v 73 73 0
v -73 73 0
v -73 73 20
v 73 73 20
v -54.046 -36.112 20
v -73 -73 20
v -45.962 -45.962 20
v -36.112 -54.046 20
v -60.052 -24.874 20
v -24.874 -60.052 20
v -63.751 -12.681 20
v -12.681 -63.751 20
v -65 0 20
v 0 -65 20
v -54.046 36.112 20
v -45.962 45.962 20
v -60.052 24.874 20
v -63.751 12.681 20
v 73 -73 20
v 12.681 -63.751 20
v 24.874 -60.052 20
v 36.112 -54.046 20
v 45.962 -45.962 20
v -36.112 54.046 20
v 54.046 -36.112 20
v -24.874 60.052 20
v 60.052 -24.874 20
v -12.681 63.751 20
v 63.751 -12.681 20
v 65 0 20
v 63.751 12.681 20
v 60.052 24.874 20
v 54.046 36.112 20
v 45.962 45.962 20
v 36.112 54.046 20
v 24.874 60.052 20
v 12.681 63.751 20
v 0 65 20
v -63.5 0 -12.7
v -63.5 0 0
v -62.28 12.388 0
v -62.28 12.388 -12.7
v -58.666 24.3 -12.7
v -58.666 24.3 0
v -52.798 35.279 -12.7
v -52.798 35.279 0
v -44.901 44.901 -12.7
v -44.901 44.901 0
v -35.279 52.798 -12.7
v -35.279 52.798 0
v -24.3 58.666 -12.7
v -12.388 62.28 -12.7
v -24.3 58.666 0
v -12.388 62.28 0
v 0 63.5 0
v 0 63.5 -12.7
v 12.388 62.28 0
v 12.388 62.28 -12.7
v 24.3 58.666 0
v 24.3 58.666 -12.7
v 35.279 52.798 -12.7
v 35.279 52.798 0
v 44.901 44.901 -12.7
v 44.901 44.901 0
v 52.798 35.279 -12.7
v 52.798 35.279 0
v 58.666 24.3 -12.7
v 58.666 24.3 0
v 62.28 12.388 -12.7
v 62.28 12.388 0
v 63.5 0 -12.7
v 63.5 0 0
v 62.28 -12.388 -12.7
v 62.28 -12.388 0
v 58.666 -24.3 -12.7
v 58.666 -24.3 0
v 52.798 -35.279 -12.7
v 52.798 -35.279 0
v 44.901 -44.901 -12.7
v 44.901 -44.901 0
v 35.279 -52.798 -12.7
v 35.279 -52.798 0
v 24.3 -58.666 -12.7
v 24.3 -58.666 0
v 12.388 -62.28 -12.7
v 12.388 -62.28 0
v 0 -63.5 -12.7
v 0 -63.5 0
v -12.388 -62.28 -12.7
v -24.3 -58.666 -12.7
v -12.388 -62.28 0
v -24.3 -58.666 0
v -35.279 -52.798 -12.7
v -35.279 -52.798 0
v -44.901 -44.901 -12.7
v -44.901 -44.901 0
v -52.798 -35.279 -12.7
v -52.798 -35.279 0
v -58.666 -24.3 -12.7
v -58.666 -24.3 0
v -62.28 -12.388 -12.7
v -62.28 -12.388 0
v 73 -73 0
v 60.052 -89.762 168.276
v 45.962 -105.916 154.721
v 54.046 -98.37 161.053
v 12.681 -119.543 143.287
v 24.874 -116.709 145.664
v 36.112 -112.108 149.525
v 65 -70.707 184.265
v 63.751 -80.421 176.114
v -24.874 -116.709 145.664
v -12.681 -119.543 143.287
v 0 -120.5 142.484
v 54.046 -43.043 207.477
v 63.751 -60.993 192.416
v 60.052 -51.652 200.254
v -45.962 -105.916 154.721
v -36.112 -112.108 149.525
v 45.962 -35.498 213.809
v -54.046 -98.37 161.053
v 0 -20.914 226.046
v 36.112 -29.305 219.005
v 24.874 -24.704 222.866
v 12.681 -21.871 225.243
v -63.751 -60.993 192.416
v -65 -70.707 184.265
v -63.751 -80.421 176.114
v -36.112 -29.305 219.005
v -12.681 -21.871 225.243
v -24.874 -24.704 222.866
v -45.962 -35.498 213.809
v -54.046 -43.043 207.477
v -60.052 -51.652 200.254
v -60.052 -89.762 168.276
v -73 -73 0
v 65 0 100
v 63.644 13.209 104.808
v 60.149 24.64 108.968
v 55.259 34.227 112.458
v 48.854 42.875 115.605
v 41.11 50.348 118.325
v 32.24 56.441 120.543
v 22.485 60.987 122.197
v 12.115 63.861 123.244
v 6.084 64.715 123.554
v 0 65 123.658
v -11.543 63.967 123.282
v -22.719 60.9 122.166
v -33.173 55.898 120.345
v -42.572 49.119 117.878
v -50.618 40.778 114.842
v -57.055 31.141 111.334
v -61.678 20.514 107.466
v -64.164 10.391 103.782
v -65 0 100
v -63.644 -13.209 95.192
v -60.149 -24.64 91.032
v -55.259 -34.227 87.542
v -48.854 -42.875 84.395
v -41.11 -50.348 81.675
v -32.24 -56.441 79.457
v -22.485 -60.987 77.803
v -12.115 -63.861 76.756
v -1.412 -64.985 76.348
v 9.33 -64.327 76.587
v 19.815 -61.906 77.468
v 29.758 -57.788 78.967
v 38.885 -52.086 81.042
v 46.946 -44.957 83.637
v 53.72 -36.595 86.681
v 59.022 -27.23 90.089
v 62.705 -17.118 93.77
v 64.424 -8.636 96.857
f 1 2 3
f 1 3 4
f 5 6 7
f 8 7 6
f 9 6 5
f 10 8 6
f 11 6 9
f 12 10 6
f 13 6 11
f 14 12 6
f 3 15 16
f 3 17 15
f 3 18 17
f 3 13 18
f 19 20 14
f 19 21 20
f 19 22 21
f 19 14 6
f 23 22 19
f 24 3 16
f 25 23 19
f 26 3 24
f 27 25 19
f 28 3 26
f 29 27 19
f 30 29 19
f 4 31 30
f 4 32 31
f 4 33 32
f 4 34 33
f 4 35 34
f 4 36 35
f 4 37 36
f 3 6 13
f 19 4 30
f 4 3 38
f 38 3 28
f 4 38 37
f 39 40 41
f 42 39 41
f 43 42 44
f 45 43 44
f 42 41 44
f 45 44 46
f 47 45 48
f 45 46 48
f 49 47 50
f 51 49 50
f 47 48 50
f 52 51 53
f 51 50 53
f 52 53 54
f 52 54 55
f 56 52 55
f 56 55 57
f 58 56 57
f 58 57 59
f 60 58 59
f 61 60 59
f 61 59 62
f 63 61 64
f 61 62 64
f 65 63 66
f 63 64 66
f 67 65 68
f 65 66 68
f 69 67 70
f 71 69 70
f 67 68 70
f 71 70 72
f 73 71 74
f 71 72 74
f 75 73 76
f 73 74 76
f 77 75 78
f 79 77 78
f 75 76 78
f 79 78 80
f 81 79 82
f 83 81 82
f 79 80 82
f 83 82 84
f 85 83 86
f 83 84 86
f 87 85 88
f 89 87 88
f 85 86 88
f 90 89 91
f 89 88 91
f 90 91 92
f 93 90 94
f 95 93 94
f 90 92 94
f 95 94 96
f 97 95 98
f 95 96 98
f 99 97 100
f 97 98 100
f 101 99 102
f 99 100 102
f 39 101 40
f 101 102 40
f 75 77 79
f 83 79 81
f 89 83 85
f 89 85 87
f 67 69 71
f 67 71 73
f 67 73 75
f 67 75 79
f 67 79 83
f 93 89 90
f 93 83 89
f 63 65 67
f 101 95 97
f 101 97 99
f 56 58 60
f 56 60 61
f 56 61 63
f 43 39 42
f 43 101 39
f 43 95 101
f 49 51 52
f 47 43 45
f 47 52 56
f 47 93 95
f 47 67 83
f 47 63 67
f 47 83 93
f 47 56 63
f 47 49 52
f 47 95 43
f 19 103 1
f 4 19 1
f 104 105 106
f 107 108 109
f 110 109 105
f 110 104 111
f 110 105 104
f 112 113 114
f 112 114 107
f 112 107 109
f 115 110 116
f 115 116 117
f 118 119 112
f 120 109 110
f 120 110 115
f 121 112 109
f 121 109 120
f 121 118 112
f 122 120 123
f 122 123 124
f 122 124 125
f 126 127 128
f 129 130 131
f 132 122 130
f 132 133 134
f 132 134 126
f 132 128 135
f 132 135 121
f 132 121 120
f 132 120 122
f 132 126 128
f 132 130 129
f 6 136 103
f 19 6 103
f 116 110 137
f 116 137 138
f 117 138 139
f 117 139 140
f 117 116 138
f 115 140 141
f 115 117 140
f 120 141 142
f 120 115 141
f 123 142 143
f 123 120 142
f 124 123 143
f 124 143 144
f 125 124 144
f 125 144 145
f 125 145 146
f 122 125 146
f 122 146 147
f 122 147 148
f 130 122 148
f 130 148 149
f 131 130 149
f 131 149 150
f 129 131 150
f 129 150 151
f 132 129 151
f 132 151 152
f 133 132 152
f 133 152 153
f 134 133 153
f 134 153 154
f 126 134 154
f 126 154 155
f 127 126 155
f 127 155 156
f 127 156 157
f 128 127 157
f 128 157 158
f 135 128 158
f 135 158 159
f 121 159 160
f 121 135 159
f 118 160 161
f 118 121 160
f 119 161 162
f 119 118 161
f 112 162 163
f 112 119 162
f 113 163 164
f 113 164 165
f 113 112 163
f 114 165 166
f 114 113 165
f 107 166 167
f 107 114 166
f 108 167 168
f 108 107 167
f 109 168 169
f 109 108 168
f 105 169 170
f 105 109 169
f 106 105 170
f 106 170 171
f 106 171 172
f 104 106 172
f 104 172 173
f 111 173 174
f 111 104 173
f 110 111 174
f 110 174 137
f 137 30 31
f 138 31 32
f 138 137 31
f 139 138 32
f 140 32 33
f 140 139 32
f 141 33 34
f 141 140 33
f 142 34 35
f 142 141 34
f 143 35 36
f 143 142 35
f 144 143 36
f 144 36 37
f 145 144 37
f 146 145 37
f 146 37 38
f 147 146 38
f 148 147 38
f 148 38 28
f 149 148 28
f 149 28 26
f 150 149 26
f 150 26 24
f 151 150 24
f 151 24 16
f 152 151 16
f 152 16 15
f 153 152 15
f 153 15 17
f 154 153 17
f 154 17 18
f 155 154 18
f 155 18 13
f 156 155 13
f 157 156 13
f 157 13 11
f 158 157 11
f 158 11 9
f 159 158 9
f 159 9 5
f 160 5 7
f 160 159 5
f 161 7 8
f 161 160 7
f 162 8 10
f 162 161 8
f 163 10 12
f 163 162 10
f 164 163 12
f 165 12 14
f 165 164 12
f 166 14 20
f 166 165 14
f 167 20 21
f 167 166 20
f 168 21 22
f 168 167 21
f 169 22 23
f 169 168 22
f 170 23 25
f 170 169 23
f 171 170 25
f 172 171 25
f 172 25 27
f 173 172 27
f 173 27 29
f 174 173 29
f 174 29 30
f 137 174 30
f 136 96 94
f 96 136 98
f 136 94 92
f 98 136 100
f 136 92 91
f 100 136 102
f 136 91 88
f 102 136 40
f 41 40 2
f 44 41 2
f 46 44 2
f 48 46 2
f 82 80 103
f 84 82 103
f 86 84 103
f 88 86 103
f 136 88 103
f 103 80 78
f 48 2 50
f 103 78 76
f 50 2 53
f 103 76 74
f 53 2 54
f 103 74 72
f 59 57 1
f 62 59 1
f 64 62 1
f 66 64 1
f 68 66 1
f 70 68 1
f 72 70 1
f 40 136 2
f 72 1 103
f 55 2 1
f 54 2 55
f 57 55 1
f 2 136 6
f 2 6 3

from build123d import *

# Parameters (mm, degrees)
SKETCH1_W           = 146
SKETCH1_H           = 146
BOSS_EXTRUDE1_DEPTH = 20
SKETCH2_R           = 63.5
BOSS_EXTRUDE2_DEPTH = 12.7
SKETCH3_R           = 65


with BuildPart() as part:
    # Sketch1 → Boss-Extrude1 (new body)
    with BuildSketch(Plane.XY):
        Rectangle(SKETCH1_W, SKETCH1_H)
    extrude(amount=BOSS_EXTRUDE1_DEPTH)

    # Sketch2 → Boss-Extrude2 (add)
    with BuildSketch(Plane(origin=(0, 0, 0), x_dir=(-1, 0, 0), z_dir=(0, 0, -1))):
        Circle(SKETCH2_R)
    extrude(amount=BOSS_EXTRUDE2_DEPTH)

    # Sweep1: sweep along a path in Sketch4
    with BuildLine(Plane(origin=(0, 0, 0), x_dir=(0, 0, -1), z_dir=(1, 0, 0))) as sweep1_path:
        Line((-20, 0), (-100, 0))
        Line((-100, 0), (-184.264888743, -70.706637066))
    # Sketch3 → Sweep1 (sweep)
    with BuildSketch(Plane.XY.offset(20)):
        Circle(SKETCH3_R)
    sweep(path=sweep1_path.line, transition=Transition.RIGHT)


solid = part.part
